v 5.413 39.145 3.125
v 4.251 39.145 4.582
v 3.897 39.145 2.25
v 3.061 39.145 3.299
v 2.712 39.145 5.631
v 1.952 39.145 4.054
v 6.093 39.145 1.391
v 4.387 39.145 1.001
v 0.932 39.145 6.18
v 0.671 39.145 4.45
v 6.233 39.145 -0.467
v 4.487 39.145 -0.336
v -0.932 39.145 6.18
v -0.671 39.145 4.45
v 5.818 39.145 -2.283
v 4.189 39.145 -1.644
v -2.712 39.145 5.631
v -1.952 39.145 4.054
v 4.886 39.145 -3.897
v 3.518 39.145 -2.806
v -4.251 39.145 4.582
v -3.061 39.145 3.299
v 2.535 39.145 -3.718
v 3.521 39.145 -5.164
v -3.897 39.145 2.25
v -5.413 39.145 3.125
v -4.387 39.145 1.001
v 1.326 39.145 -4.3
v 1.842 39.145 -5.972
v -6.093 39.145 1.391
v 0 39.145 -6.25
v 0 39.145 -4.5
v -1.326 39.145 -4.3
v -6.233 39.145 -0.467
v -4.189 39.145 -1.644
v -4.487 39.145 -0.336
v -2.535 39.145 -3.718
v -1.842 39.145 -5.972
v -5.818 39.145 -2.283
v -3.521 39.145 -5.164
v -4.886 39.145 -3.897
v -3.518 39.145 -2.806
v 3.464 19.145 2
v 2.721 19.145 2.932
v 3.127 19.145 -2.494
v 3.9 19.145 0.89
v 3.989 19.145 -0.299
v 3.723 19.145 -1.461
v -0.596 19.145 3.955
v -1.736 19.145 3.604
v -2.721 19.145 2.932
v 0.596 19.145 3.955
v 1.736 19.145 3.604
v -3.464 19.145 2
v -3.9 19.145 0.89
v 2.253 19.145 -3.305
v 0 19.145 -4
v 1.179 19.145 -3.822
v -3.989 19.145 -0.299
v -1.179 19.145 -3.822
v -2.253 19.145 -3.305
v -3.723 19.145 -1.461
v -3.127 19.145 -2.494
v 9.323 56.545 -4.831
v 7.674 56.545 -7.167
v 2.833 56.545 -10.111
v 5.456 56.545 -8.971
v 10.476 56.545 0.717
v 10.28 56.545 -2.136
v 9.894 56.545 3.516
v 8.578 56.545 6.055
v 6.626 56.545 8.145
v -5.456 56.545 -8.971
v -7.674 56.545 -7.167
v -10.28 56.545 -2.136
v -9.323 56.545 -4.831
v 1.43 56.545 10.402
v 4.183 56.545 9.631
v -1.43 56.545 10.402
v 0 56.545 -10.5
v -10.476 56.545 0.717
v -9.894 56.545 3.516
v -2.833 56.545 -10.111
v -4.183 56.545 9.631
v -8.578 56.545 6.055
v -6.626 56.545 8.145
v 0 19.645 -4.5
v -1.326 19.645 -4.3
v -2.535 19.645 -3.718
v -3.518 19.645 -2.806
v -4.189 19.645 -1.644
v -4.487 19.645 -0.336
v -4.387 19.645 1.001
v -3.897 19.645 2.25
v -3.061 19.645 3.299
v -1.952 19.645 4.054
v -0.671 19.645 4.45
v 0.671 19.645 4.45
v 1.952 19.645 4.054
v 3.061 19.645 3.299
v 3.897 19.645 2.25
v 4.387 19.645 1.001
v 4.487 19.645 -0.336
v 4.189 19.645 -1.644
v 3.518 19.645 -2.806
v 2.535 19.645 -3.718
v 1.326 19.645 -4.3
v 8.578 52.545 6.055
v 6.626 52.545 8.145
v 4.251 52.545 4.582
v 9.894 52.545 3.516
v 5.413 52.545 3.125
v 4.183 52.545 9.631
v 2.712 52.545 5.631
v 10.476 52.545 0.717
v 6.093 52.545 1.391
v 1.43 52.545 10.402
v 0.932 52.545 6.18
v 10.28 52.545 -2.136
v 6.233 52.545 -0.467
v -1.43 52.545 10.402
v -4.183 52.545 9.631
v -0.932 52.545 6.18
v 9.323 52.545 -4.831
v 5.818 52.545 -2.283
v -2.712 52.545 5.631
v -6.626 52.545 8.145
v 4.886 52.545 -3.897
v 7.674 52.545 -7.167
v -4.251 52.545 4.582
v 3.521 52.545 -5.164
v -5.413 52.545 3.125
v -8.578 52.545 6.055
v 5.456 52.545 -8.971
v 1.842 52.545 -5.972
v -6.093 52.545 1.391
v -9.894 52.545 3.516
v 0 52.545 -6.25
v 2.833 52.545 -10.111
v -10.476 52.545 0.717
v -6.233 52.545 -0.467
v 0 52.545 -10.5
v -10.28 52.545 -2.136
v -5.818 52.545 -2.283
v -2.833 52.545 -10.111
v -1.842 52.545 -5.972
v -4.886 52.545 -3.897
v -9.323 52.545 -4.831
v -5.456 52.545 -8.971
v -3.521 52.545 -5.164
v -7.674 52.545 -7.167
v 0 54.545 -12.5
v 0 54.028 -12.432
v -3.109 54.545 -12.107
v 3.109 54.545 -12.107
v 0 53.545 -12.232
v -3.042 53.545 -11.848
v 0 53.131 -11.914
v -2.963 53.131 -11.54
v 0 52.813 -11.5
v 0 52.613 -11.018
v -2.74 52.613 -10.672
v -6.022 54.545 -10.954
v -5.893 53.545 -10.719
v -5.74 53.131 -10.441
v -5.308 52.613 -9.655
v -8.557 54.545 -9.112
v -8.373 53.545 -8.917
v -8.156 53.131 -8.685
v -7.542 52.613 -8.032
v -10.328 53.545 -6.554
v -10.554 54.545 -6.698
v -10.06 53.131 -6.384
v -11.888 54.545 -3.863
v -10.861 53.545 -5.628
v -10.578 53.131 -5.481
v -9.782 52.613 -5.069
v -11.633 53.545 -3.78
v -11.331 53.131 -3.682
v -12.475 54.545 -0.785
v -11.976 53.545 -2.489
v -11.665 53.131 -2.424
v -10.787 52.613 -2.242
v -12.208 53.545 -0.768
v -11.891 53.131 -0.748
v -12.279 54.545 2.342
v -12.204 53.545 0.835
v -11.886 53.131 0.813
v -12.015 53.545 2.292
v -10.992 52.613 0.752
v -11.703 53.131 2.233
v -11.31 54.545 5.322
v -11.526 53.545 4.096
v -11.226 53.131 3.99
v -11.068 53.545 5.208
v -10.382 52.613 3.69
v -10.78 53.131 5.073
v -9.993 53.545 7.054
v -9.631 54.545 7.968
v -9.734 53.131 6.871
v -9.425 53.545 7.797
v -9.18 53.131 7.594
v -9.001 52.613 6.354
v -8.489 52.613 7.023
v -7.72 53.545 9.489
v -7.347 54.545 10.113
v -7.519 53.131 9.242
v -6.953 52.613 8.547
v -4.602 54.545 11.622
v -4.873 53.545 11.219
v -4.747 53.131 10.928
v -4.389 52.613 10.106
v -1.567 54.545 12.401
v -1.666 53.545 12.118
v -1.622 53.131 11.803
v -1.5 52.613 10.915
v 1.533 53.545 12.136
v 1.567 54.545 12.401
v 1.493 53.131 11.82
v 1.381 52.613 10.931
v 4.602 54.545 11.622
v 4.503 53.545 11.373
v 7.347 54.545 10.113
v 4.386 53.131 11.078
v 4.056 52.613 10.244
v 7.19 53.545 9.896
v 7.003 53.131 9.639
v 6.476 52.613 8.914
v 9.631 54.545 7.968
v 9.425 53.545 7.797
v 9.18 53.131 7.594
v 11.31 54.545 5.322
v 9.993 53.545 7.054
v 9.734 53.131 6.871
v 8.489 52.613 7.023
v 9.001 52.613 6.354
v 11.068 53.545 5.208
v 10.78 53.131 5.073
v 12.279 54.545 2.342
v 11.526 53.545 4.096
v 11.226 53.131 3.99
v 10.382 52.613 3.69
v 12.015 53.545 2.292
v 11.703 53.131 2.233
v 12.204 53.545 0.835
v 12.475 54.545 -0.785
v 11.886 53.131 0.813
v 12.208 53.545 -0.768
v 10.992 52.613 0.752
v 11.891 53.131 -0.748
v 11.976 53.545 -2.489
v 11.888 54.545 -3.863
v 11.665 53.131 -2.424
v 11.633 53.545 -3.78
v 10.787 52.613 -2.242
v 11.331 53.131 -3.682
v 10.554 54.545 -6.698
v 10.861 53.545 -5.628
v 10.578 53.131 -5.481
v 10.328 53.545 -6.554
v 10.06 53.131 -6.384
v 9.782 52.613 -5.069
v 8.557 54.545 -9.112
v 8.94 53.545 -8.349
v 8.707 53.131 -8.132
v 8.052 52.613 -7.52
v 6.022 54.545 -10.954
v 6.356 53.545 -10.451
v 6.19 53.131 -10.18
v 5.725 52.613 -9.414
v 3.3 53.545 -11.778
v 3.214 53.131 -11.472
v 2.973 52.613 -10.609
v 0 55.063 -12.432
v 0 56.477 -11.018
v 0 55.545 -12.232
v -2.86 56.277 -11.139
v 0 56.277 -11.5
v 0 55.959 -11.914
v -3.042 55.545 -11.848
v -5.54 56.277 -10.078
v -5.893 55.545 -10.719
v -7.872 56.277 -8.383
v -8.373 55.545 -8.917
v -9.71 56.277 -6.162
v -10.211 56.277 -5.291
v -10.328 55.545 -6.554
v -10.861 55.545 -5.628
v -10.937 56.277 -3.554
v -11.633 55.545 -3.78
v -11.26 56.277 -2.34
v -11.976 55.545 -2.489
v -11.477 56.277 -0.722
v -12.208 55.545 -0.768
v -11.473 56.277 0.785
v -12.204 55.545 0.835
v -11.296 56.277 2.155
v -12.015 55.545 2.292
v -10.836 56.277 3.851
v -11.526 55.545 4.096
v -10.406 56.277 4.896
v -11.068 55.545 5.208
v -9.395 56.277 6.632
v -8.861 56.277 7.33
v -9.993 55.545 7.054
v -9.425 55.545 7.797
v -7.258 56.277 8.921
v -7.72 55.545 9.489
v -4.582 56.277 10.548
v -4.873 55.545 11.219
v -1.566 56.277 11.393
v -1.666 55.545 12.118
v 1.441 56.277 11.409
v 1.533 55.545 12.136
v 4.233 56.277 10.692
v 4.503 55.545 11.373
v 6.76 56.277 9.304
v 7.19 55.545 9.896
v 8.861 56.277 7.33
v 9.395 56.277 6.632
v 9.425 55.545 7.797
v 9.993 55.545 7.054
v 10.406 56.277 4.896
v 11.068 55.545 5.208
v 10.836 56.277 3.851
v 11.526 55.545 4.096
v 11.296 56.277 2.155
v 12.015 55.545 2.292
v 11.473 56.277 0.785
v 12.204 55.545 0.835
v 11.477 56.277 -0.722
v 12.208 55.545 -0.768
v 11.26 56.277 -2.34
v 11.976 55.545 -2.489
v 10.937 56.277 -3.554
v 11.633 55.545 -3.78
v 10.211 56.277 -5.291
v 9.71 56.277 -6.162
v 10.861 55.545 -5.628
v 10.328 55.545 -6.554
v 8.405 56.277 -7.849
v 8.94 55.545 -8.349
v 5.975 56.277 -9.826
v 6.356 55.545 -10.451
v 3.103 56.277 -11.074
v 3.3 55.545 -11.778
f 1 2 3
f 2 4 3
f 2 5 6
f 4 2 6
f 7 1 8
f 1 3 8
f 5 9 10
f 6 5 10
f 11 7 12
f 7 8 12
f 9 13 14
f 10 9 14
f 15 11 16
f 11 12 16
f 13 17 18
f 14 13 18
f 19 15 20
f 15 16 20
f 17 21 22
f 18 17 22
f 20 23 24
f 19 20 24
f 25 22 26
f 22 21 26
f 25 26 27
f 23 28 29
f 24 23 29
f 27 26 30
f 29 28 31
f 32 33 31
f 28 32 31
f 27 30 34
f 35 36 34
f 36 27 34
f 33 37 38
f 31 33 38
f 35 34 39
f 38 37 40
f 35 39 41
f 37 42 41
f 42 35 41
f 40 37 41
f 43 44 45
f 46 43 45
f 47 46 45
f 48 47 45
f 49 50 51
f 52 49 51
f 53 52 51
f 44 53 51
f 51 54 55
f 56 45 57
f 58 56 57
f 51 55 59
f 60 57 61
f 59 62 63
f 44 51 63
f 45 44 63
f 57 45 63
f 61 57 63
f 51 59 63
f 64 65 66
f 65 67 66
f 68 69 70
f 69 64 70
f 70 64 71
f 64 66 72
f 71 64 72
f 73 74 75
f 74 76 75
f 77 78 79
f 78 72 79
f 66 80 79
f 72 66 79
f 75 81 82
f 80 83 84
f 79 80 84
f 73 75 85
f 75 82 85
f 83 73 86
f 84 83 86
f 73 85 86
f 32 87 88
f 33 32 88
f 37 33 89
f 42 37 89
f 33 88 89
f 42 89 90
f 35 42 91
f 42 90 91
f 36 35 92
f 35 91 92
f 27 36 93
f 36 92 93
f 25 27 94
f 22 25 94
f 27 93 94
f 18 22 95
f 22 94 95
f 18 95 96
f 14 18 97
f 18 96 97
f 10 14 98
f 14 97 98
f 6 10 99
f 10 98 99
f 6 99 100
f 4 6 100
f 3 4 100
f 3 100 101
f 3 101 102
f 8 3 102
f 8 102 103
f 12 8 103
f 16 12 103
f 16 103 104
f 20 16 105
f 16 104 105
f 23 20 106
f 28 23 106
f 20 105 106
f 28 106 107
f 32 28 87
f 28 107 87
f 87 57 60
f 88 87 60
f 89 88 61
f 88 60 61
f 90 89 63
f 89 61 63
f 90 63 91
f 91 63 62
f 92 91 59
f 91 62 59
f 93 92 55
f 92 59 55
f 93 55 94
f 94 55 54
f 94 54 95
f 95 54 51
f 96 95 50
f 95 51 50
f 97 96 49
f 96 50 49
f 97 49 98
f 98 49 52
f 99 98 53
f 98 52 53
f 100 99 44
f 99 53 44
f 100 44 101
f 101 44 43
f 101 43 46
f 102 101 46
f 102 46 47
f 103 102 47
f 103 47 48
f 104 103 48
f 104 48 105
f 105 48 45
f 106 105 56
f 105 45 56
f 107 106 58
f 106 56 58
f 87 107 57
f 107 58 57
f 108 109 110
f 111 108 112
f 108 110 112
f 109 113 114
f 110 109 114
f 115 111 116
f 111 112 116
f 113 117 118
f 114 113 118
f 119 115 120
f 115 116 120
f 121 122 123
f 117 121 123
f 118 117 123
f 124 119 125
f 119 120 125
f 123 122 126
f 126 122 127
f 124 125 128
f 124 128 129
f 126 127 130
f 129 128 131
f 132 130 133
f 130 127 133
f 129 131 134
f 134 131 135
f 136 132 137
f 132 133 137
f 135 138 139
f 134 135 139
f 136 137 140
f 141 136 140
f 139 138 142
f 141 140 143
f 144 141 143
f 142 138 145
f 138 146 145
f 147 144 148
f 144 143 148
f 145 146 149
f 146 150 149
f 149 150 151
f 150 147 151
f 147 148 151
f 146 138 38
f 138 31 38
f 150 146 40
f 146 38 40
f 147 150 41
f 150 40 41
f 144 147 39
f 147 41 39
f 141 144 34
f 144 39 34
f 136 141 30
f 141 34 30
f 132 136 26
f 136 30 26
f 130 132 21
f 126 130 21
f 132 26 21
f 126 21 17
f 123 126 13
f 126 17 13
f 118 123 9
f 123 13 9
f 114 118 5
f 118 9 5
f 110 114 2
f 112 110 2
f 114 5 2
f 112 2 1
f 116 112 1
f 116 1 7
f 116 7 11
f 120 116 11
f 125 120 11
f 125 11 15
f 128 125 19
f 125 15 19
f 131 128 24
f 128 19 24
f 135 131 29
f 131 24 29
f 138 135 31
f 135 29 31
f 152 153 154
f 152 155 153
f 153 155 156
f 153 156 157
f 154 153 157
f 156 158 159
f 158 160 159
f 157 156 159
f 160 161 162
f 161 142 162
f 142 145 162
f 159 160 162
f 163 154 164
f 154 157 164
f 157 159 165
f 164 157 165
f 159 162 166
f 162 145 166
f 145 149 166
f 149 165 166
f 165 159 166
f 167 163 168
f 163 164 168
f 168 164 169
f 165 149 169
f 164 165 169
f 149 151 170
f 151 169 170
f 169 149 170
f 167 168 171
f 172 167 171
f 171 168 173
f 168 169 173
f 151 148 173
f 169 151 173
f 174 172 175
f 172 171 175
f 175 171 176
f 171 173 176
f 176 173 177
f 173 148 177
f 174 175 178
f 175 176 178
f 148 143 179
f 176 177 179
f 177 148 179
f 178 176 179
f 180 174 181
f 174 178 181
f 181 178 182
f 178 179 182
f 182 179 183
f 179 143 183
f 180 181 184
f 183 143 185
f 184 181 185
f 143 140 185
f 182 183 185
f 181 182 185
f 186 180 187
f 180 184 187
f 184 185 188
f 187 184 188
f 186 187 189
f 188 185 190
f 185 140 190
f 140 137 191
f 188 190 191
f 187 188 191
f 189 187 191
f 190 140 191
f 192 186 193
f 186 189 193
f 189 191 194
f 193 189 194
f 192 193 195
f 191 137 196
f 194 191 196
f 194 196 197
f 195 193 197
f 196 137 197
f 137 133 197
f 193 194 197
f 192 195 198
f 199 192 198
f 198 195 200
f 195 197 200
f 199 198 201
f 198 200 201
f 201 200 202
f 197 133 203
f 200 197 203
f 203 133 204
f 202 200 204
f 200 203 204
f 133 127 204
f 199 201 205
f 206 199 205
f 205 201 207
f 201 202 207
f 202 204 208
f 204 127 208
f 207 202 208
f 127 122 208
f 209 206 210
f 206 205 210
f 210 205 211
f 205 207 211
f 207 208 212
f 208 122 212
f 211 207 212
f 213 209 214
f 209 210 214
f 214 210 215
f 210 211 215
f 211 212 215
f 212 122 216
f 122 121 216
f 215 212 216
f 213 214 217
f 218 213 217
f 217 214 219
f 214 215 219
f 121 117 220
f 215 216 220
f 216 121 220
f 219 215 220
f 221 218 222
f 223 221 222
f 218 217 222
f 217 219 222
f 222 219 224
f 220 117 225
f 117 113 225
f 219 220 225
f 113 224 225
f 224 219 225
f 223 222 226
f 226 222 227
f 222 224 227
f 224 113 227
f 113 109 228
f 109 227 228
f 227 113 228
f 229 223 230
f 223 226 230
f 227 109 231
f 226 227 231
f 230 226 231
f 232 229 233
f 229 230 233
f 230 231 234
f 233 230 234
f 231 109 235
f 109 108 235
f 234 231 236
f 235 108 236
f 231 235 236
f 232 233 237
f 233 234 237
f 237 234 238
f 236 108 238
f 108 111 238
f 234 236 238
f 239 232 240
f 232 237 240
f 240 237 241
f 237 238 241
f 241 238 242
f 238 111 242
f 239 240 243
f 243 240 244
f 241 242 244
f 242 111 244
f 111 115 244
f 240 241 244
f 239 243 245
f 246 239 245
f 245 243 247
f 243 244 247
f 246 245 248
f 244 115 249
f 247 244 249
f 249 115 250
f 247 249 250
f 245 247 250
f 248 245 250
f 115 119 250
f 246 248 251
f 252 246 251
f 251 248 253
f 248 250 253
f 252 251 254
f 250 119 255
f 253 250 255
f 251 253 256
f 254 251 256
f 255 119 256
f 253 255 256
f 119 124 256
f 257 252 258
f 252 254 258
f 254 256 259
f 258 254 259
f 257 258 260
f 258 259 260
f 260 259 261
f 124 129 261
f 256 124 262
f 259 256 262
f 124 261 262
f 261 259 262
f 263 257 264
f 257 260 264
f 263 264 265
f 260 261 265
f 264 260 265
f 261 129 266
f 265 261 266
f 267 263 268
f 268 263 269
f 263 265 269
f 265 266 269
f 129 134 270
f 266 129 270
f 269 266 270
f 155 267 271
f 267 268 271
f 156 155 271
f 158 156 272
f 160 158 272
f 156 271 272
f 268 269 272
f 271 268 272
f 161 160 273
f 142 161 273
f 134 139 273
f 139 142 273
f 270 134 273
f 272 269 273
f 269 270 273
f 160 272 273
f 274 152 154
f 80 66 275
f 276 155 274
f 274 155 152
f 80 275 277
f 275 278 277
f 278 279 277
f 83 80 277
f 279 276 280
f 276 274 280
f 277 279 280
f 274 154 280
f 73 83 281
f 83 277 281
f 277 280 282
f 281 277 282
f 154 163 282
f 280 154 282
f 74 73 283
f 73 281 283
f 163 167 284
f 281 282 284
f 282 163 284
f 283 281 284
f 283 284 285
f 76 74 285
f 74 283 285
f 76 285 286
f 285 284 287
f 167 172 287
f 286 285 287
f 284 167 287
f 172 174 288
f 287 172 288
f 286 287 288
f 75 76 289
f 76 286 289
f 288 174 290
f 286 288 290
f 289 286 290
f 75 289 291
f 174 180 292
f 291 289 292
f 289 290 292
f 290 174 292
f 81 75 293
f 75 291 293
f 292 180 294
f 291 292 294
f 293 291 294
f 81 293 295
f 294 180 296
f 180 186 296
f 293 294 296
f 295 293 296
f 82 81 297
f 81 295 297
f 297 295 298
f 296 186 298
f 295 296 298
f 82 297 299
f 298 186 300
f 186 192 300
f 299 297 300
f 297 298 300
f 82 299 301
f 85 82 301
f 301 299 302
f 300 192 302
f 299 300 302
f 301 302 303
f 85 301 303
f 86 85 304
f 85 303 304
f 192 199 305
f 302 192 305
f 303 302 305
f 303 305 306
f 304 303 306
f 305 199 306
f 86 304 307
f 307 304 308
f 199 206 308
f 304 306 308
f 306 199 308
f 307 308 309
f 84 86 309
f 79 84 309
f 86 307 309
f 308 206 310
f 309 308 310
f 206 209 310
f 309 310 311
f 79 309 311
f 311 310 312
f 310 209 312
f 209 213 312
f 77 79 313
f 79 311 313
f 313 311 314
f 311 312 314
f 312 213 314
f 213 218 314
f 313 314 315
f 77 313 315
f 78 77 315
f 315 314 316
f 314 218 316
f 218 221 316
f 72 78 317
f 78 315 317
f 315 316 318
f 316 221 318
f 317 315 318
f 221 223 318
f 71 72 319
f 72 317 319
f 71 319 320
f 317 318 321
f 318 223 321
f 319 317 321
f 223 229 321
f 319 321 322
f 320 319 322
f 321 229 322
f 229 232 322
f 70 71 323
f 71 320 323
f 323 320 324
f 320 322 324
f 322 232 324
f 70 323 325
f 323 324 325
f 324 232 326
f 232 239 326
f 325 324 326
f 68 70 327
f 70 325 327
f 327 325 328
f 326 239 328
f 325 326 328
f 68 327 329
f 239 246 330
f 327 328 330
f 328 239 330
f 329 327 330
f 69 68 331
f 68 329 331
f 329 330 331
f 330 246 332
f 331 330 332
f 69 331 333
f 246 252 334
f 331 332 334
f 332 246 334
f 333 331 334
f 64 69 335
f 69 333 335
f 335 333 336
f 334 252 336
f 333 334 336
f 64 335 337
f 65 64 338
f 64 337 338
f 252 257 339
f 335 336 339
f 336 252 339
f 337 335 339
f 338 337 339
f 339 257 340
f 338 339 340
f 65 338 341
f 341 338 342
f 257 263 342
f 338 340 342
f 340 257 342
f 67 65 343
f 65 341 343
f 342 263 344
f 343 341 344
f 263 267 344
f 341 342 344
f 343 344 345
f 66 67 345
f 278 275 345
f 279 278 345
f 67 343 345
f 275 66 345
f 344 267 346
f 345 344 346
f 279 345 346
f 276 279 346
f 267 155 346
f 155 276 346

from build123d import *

# Parameters (mm, degrees)
FILETE2_R     = 2
CHANFRO1_SIZE = 0.5


with BuildPart() as part:
    # Esboço1 → Revolução1 (revolve)
    with BuildSketch(Plane.XY, mode=Mode.PRIVATE) as revolu_o1_sk:
        Polygon((0, 56.545238095), (12.5, 56.545238095), (12.5, 52.545238095), (6.25, 52.545238095), (6.25, 39.145238095), (4.5, 39.145238095), (4.5, 19.145238095), (0, 19.145238095), align=None)
    revolve(revolu_o1_sk.sketch.rotate(Axis((0, -62.761627907, 0), (0, 1, 0)), 90), axis=Axis((0, -62.761627907, 0), (0, 1, 0)))

    # Filete2
    filete2_edges = [part.edges().sort_by_distance(p)[0] for p in [
        (0, 52.545238095, 12.5),
        (0, 56.545238095, 12.5),
    ]]
    fillet(filete2_edges, radius=FILETE2_R - 0.0001)  # a hair under: the kernel refuses the full size

    # Chanfro1
    chanfro1_edges = [part.edges().sort_by_distance(p)[0] for p in [
        (0, 19.145238095, 4.5),
    ]]
    chamfer(chanfro1_edges, length=CHANFRO1_SIZE)


solid = part.part
